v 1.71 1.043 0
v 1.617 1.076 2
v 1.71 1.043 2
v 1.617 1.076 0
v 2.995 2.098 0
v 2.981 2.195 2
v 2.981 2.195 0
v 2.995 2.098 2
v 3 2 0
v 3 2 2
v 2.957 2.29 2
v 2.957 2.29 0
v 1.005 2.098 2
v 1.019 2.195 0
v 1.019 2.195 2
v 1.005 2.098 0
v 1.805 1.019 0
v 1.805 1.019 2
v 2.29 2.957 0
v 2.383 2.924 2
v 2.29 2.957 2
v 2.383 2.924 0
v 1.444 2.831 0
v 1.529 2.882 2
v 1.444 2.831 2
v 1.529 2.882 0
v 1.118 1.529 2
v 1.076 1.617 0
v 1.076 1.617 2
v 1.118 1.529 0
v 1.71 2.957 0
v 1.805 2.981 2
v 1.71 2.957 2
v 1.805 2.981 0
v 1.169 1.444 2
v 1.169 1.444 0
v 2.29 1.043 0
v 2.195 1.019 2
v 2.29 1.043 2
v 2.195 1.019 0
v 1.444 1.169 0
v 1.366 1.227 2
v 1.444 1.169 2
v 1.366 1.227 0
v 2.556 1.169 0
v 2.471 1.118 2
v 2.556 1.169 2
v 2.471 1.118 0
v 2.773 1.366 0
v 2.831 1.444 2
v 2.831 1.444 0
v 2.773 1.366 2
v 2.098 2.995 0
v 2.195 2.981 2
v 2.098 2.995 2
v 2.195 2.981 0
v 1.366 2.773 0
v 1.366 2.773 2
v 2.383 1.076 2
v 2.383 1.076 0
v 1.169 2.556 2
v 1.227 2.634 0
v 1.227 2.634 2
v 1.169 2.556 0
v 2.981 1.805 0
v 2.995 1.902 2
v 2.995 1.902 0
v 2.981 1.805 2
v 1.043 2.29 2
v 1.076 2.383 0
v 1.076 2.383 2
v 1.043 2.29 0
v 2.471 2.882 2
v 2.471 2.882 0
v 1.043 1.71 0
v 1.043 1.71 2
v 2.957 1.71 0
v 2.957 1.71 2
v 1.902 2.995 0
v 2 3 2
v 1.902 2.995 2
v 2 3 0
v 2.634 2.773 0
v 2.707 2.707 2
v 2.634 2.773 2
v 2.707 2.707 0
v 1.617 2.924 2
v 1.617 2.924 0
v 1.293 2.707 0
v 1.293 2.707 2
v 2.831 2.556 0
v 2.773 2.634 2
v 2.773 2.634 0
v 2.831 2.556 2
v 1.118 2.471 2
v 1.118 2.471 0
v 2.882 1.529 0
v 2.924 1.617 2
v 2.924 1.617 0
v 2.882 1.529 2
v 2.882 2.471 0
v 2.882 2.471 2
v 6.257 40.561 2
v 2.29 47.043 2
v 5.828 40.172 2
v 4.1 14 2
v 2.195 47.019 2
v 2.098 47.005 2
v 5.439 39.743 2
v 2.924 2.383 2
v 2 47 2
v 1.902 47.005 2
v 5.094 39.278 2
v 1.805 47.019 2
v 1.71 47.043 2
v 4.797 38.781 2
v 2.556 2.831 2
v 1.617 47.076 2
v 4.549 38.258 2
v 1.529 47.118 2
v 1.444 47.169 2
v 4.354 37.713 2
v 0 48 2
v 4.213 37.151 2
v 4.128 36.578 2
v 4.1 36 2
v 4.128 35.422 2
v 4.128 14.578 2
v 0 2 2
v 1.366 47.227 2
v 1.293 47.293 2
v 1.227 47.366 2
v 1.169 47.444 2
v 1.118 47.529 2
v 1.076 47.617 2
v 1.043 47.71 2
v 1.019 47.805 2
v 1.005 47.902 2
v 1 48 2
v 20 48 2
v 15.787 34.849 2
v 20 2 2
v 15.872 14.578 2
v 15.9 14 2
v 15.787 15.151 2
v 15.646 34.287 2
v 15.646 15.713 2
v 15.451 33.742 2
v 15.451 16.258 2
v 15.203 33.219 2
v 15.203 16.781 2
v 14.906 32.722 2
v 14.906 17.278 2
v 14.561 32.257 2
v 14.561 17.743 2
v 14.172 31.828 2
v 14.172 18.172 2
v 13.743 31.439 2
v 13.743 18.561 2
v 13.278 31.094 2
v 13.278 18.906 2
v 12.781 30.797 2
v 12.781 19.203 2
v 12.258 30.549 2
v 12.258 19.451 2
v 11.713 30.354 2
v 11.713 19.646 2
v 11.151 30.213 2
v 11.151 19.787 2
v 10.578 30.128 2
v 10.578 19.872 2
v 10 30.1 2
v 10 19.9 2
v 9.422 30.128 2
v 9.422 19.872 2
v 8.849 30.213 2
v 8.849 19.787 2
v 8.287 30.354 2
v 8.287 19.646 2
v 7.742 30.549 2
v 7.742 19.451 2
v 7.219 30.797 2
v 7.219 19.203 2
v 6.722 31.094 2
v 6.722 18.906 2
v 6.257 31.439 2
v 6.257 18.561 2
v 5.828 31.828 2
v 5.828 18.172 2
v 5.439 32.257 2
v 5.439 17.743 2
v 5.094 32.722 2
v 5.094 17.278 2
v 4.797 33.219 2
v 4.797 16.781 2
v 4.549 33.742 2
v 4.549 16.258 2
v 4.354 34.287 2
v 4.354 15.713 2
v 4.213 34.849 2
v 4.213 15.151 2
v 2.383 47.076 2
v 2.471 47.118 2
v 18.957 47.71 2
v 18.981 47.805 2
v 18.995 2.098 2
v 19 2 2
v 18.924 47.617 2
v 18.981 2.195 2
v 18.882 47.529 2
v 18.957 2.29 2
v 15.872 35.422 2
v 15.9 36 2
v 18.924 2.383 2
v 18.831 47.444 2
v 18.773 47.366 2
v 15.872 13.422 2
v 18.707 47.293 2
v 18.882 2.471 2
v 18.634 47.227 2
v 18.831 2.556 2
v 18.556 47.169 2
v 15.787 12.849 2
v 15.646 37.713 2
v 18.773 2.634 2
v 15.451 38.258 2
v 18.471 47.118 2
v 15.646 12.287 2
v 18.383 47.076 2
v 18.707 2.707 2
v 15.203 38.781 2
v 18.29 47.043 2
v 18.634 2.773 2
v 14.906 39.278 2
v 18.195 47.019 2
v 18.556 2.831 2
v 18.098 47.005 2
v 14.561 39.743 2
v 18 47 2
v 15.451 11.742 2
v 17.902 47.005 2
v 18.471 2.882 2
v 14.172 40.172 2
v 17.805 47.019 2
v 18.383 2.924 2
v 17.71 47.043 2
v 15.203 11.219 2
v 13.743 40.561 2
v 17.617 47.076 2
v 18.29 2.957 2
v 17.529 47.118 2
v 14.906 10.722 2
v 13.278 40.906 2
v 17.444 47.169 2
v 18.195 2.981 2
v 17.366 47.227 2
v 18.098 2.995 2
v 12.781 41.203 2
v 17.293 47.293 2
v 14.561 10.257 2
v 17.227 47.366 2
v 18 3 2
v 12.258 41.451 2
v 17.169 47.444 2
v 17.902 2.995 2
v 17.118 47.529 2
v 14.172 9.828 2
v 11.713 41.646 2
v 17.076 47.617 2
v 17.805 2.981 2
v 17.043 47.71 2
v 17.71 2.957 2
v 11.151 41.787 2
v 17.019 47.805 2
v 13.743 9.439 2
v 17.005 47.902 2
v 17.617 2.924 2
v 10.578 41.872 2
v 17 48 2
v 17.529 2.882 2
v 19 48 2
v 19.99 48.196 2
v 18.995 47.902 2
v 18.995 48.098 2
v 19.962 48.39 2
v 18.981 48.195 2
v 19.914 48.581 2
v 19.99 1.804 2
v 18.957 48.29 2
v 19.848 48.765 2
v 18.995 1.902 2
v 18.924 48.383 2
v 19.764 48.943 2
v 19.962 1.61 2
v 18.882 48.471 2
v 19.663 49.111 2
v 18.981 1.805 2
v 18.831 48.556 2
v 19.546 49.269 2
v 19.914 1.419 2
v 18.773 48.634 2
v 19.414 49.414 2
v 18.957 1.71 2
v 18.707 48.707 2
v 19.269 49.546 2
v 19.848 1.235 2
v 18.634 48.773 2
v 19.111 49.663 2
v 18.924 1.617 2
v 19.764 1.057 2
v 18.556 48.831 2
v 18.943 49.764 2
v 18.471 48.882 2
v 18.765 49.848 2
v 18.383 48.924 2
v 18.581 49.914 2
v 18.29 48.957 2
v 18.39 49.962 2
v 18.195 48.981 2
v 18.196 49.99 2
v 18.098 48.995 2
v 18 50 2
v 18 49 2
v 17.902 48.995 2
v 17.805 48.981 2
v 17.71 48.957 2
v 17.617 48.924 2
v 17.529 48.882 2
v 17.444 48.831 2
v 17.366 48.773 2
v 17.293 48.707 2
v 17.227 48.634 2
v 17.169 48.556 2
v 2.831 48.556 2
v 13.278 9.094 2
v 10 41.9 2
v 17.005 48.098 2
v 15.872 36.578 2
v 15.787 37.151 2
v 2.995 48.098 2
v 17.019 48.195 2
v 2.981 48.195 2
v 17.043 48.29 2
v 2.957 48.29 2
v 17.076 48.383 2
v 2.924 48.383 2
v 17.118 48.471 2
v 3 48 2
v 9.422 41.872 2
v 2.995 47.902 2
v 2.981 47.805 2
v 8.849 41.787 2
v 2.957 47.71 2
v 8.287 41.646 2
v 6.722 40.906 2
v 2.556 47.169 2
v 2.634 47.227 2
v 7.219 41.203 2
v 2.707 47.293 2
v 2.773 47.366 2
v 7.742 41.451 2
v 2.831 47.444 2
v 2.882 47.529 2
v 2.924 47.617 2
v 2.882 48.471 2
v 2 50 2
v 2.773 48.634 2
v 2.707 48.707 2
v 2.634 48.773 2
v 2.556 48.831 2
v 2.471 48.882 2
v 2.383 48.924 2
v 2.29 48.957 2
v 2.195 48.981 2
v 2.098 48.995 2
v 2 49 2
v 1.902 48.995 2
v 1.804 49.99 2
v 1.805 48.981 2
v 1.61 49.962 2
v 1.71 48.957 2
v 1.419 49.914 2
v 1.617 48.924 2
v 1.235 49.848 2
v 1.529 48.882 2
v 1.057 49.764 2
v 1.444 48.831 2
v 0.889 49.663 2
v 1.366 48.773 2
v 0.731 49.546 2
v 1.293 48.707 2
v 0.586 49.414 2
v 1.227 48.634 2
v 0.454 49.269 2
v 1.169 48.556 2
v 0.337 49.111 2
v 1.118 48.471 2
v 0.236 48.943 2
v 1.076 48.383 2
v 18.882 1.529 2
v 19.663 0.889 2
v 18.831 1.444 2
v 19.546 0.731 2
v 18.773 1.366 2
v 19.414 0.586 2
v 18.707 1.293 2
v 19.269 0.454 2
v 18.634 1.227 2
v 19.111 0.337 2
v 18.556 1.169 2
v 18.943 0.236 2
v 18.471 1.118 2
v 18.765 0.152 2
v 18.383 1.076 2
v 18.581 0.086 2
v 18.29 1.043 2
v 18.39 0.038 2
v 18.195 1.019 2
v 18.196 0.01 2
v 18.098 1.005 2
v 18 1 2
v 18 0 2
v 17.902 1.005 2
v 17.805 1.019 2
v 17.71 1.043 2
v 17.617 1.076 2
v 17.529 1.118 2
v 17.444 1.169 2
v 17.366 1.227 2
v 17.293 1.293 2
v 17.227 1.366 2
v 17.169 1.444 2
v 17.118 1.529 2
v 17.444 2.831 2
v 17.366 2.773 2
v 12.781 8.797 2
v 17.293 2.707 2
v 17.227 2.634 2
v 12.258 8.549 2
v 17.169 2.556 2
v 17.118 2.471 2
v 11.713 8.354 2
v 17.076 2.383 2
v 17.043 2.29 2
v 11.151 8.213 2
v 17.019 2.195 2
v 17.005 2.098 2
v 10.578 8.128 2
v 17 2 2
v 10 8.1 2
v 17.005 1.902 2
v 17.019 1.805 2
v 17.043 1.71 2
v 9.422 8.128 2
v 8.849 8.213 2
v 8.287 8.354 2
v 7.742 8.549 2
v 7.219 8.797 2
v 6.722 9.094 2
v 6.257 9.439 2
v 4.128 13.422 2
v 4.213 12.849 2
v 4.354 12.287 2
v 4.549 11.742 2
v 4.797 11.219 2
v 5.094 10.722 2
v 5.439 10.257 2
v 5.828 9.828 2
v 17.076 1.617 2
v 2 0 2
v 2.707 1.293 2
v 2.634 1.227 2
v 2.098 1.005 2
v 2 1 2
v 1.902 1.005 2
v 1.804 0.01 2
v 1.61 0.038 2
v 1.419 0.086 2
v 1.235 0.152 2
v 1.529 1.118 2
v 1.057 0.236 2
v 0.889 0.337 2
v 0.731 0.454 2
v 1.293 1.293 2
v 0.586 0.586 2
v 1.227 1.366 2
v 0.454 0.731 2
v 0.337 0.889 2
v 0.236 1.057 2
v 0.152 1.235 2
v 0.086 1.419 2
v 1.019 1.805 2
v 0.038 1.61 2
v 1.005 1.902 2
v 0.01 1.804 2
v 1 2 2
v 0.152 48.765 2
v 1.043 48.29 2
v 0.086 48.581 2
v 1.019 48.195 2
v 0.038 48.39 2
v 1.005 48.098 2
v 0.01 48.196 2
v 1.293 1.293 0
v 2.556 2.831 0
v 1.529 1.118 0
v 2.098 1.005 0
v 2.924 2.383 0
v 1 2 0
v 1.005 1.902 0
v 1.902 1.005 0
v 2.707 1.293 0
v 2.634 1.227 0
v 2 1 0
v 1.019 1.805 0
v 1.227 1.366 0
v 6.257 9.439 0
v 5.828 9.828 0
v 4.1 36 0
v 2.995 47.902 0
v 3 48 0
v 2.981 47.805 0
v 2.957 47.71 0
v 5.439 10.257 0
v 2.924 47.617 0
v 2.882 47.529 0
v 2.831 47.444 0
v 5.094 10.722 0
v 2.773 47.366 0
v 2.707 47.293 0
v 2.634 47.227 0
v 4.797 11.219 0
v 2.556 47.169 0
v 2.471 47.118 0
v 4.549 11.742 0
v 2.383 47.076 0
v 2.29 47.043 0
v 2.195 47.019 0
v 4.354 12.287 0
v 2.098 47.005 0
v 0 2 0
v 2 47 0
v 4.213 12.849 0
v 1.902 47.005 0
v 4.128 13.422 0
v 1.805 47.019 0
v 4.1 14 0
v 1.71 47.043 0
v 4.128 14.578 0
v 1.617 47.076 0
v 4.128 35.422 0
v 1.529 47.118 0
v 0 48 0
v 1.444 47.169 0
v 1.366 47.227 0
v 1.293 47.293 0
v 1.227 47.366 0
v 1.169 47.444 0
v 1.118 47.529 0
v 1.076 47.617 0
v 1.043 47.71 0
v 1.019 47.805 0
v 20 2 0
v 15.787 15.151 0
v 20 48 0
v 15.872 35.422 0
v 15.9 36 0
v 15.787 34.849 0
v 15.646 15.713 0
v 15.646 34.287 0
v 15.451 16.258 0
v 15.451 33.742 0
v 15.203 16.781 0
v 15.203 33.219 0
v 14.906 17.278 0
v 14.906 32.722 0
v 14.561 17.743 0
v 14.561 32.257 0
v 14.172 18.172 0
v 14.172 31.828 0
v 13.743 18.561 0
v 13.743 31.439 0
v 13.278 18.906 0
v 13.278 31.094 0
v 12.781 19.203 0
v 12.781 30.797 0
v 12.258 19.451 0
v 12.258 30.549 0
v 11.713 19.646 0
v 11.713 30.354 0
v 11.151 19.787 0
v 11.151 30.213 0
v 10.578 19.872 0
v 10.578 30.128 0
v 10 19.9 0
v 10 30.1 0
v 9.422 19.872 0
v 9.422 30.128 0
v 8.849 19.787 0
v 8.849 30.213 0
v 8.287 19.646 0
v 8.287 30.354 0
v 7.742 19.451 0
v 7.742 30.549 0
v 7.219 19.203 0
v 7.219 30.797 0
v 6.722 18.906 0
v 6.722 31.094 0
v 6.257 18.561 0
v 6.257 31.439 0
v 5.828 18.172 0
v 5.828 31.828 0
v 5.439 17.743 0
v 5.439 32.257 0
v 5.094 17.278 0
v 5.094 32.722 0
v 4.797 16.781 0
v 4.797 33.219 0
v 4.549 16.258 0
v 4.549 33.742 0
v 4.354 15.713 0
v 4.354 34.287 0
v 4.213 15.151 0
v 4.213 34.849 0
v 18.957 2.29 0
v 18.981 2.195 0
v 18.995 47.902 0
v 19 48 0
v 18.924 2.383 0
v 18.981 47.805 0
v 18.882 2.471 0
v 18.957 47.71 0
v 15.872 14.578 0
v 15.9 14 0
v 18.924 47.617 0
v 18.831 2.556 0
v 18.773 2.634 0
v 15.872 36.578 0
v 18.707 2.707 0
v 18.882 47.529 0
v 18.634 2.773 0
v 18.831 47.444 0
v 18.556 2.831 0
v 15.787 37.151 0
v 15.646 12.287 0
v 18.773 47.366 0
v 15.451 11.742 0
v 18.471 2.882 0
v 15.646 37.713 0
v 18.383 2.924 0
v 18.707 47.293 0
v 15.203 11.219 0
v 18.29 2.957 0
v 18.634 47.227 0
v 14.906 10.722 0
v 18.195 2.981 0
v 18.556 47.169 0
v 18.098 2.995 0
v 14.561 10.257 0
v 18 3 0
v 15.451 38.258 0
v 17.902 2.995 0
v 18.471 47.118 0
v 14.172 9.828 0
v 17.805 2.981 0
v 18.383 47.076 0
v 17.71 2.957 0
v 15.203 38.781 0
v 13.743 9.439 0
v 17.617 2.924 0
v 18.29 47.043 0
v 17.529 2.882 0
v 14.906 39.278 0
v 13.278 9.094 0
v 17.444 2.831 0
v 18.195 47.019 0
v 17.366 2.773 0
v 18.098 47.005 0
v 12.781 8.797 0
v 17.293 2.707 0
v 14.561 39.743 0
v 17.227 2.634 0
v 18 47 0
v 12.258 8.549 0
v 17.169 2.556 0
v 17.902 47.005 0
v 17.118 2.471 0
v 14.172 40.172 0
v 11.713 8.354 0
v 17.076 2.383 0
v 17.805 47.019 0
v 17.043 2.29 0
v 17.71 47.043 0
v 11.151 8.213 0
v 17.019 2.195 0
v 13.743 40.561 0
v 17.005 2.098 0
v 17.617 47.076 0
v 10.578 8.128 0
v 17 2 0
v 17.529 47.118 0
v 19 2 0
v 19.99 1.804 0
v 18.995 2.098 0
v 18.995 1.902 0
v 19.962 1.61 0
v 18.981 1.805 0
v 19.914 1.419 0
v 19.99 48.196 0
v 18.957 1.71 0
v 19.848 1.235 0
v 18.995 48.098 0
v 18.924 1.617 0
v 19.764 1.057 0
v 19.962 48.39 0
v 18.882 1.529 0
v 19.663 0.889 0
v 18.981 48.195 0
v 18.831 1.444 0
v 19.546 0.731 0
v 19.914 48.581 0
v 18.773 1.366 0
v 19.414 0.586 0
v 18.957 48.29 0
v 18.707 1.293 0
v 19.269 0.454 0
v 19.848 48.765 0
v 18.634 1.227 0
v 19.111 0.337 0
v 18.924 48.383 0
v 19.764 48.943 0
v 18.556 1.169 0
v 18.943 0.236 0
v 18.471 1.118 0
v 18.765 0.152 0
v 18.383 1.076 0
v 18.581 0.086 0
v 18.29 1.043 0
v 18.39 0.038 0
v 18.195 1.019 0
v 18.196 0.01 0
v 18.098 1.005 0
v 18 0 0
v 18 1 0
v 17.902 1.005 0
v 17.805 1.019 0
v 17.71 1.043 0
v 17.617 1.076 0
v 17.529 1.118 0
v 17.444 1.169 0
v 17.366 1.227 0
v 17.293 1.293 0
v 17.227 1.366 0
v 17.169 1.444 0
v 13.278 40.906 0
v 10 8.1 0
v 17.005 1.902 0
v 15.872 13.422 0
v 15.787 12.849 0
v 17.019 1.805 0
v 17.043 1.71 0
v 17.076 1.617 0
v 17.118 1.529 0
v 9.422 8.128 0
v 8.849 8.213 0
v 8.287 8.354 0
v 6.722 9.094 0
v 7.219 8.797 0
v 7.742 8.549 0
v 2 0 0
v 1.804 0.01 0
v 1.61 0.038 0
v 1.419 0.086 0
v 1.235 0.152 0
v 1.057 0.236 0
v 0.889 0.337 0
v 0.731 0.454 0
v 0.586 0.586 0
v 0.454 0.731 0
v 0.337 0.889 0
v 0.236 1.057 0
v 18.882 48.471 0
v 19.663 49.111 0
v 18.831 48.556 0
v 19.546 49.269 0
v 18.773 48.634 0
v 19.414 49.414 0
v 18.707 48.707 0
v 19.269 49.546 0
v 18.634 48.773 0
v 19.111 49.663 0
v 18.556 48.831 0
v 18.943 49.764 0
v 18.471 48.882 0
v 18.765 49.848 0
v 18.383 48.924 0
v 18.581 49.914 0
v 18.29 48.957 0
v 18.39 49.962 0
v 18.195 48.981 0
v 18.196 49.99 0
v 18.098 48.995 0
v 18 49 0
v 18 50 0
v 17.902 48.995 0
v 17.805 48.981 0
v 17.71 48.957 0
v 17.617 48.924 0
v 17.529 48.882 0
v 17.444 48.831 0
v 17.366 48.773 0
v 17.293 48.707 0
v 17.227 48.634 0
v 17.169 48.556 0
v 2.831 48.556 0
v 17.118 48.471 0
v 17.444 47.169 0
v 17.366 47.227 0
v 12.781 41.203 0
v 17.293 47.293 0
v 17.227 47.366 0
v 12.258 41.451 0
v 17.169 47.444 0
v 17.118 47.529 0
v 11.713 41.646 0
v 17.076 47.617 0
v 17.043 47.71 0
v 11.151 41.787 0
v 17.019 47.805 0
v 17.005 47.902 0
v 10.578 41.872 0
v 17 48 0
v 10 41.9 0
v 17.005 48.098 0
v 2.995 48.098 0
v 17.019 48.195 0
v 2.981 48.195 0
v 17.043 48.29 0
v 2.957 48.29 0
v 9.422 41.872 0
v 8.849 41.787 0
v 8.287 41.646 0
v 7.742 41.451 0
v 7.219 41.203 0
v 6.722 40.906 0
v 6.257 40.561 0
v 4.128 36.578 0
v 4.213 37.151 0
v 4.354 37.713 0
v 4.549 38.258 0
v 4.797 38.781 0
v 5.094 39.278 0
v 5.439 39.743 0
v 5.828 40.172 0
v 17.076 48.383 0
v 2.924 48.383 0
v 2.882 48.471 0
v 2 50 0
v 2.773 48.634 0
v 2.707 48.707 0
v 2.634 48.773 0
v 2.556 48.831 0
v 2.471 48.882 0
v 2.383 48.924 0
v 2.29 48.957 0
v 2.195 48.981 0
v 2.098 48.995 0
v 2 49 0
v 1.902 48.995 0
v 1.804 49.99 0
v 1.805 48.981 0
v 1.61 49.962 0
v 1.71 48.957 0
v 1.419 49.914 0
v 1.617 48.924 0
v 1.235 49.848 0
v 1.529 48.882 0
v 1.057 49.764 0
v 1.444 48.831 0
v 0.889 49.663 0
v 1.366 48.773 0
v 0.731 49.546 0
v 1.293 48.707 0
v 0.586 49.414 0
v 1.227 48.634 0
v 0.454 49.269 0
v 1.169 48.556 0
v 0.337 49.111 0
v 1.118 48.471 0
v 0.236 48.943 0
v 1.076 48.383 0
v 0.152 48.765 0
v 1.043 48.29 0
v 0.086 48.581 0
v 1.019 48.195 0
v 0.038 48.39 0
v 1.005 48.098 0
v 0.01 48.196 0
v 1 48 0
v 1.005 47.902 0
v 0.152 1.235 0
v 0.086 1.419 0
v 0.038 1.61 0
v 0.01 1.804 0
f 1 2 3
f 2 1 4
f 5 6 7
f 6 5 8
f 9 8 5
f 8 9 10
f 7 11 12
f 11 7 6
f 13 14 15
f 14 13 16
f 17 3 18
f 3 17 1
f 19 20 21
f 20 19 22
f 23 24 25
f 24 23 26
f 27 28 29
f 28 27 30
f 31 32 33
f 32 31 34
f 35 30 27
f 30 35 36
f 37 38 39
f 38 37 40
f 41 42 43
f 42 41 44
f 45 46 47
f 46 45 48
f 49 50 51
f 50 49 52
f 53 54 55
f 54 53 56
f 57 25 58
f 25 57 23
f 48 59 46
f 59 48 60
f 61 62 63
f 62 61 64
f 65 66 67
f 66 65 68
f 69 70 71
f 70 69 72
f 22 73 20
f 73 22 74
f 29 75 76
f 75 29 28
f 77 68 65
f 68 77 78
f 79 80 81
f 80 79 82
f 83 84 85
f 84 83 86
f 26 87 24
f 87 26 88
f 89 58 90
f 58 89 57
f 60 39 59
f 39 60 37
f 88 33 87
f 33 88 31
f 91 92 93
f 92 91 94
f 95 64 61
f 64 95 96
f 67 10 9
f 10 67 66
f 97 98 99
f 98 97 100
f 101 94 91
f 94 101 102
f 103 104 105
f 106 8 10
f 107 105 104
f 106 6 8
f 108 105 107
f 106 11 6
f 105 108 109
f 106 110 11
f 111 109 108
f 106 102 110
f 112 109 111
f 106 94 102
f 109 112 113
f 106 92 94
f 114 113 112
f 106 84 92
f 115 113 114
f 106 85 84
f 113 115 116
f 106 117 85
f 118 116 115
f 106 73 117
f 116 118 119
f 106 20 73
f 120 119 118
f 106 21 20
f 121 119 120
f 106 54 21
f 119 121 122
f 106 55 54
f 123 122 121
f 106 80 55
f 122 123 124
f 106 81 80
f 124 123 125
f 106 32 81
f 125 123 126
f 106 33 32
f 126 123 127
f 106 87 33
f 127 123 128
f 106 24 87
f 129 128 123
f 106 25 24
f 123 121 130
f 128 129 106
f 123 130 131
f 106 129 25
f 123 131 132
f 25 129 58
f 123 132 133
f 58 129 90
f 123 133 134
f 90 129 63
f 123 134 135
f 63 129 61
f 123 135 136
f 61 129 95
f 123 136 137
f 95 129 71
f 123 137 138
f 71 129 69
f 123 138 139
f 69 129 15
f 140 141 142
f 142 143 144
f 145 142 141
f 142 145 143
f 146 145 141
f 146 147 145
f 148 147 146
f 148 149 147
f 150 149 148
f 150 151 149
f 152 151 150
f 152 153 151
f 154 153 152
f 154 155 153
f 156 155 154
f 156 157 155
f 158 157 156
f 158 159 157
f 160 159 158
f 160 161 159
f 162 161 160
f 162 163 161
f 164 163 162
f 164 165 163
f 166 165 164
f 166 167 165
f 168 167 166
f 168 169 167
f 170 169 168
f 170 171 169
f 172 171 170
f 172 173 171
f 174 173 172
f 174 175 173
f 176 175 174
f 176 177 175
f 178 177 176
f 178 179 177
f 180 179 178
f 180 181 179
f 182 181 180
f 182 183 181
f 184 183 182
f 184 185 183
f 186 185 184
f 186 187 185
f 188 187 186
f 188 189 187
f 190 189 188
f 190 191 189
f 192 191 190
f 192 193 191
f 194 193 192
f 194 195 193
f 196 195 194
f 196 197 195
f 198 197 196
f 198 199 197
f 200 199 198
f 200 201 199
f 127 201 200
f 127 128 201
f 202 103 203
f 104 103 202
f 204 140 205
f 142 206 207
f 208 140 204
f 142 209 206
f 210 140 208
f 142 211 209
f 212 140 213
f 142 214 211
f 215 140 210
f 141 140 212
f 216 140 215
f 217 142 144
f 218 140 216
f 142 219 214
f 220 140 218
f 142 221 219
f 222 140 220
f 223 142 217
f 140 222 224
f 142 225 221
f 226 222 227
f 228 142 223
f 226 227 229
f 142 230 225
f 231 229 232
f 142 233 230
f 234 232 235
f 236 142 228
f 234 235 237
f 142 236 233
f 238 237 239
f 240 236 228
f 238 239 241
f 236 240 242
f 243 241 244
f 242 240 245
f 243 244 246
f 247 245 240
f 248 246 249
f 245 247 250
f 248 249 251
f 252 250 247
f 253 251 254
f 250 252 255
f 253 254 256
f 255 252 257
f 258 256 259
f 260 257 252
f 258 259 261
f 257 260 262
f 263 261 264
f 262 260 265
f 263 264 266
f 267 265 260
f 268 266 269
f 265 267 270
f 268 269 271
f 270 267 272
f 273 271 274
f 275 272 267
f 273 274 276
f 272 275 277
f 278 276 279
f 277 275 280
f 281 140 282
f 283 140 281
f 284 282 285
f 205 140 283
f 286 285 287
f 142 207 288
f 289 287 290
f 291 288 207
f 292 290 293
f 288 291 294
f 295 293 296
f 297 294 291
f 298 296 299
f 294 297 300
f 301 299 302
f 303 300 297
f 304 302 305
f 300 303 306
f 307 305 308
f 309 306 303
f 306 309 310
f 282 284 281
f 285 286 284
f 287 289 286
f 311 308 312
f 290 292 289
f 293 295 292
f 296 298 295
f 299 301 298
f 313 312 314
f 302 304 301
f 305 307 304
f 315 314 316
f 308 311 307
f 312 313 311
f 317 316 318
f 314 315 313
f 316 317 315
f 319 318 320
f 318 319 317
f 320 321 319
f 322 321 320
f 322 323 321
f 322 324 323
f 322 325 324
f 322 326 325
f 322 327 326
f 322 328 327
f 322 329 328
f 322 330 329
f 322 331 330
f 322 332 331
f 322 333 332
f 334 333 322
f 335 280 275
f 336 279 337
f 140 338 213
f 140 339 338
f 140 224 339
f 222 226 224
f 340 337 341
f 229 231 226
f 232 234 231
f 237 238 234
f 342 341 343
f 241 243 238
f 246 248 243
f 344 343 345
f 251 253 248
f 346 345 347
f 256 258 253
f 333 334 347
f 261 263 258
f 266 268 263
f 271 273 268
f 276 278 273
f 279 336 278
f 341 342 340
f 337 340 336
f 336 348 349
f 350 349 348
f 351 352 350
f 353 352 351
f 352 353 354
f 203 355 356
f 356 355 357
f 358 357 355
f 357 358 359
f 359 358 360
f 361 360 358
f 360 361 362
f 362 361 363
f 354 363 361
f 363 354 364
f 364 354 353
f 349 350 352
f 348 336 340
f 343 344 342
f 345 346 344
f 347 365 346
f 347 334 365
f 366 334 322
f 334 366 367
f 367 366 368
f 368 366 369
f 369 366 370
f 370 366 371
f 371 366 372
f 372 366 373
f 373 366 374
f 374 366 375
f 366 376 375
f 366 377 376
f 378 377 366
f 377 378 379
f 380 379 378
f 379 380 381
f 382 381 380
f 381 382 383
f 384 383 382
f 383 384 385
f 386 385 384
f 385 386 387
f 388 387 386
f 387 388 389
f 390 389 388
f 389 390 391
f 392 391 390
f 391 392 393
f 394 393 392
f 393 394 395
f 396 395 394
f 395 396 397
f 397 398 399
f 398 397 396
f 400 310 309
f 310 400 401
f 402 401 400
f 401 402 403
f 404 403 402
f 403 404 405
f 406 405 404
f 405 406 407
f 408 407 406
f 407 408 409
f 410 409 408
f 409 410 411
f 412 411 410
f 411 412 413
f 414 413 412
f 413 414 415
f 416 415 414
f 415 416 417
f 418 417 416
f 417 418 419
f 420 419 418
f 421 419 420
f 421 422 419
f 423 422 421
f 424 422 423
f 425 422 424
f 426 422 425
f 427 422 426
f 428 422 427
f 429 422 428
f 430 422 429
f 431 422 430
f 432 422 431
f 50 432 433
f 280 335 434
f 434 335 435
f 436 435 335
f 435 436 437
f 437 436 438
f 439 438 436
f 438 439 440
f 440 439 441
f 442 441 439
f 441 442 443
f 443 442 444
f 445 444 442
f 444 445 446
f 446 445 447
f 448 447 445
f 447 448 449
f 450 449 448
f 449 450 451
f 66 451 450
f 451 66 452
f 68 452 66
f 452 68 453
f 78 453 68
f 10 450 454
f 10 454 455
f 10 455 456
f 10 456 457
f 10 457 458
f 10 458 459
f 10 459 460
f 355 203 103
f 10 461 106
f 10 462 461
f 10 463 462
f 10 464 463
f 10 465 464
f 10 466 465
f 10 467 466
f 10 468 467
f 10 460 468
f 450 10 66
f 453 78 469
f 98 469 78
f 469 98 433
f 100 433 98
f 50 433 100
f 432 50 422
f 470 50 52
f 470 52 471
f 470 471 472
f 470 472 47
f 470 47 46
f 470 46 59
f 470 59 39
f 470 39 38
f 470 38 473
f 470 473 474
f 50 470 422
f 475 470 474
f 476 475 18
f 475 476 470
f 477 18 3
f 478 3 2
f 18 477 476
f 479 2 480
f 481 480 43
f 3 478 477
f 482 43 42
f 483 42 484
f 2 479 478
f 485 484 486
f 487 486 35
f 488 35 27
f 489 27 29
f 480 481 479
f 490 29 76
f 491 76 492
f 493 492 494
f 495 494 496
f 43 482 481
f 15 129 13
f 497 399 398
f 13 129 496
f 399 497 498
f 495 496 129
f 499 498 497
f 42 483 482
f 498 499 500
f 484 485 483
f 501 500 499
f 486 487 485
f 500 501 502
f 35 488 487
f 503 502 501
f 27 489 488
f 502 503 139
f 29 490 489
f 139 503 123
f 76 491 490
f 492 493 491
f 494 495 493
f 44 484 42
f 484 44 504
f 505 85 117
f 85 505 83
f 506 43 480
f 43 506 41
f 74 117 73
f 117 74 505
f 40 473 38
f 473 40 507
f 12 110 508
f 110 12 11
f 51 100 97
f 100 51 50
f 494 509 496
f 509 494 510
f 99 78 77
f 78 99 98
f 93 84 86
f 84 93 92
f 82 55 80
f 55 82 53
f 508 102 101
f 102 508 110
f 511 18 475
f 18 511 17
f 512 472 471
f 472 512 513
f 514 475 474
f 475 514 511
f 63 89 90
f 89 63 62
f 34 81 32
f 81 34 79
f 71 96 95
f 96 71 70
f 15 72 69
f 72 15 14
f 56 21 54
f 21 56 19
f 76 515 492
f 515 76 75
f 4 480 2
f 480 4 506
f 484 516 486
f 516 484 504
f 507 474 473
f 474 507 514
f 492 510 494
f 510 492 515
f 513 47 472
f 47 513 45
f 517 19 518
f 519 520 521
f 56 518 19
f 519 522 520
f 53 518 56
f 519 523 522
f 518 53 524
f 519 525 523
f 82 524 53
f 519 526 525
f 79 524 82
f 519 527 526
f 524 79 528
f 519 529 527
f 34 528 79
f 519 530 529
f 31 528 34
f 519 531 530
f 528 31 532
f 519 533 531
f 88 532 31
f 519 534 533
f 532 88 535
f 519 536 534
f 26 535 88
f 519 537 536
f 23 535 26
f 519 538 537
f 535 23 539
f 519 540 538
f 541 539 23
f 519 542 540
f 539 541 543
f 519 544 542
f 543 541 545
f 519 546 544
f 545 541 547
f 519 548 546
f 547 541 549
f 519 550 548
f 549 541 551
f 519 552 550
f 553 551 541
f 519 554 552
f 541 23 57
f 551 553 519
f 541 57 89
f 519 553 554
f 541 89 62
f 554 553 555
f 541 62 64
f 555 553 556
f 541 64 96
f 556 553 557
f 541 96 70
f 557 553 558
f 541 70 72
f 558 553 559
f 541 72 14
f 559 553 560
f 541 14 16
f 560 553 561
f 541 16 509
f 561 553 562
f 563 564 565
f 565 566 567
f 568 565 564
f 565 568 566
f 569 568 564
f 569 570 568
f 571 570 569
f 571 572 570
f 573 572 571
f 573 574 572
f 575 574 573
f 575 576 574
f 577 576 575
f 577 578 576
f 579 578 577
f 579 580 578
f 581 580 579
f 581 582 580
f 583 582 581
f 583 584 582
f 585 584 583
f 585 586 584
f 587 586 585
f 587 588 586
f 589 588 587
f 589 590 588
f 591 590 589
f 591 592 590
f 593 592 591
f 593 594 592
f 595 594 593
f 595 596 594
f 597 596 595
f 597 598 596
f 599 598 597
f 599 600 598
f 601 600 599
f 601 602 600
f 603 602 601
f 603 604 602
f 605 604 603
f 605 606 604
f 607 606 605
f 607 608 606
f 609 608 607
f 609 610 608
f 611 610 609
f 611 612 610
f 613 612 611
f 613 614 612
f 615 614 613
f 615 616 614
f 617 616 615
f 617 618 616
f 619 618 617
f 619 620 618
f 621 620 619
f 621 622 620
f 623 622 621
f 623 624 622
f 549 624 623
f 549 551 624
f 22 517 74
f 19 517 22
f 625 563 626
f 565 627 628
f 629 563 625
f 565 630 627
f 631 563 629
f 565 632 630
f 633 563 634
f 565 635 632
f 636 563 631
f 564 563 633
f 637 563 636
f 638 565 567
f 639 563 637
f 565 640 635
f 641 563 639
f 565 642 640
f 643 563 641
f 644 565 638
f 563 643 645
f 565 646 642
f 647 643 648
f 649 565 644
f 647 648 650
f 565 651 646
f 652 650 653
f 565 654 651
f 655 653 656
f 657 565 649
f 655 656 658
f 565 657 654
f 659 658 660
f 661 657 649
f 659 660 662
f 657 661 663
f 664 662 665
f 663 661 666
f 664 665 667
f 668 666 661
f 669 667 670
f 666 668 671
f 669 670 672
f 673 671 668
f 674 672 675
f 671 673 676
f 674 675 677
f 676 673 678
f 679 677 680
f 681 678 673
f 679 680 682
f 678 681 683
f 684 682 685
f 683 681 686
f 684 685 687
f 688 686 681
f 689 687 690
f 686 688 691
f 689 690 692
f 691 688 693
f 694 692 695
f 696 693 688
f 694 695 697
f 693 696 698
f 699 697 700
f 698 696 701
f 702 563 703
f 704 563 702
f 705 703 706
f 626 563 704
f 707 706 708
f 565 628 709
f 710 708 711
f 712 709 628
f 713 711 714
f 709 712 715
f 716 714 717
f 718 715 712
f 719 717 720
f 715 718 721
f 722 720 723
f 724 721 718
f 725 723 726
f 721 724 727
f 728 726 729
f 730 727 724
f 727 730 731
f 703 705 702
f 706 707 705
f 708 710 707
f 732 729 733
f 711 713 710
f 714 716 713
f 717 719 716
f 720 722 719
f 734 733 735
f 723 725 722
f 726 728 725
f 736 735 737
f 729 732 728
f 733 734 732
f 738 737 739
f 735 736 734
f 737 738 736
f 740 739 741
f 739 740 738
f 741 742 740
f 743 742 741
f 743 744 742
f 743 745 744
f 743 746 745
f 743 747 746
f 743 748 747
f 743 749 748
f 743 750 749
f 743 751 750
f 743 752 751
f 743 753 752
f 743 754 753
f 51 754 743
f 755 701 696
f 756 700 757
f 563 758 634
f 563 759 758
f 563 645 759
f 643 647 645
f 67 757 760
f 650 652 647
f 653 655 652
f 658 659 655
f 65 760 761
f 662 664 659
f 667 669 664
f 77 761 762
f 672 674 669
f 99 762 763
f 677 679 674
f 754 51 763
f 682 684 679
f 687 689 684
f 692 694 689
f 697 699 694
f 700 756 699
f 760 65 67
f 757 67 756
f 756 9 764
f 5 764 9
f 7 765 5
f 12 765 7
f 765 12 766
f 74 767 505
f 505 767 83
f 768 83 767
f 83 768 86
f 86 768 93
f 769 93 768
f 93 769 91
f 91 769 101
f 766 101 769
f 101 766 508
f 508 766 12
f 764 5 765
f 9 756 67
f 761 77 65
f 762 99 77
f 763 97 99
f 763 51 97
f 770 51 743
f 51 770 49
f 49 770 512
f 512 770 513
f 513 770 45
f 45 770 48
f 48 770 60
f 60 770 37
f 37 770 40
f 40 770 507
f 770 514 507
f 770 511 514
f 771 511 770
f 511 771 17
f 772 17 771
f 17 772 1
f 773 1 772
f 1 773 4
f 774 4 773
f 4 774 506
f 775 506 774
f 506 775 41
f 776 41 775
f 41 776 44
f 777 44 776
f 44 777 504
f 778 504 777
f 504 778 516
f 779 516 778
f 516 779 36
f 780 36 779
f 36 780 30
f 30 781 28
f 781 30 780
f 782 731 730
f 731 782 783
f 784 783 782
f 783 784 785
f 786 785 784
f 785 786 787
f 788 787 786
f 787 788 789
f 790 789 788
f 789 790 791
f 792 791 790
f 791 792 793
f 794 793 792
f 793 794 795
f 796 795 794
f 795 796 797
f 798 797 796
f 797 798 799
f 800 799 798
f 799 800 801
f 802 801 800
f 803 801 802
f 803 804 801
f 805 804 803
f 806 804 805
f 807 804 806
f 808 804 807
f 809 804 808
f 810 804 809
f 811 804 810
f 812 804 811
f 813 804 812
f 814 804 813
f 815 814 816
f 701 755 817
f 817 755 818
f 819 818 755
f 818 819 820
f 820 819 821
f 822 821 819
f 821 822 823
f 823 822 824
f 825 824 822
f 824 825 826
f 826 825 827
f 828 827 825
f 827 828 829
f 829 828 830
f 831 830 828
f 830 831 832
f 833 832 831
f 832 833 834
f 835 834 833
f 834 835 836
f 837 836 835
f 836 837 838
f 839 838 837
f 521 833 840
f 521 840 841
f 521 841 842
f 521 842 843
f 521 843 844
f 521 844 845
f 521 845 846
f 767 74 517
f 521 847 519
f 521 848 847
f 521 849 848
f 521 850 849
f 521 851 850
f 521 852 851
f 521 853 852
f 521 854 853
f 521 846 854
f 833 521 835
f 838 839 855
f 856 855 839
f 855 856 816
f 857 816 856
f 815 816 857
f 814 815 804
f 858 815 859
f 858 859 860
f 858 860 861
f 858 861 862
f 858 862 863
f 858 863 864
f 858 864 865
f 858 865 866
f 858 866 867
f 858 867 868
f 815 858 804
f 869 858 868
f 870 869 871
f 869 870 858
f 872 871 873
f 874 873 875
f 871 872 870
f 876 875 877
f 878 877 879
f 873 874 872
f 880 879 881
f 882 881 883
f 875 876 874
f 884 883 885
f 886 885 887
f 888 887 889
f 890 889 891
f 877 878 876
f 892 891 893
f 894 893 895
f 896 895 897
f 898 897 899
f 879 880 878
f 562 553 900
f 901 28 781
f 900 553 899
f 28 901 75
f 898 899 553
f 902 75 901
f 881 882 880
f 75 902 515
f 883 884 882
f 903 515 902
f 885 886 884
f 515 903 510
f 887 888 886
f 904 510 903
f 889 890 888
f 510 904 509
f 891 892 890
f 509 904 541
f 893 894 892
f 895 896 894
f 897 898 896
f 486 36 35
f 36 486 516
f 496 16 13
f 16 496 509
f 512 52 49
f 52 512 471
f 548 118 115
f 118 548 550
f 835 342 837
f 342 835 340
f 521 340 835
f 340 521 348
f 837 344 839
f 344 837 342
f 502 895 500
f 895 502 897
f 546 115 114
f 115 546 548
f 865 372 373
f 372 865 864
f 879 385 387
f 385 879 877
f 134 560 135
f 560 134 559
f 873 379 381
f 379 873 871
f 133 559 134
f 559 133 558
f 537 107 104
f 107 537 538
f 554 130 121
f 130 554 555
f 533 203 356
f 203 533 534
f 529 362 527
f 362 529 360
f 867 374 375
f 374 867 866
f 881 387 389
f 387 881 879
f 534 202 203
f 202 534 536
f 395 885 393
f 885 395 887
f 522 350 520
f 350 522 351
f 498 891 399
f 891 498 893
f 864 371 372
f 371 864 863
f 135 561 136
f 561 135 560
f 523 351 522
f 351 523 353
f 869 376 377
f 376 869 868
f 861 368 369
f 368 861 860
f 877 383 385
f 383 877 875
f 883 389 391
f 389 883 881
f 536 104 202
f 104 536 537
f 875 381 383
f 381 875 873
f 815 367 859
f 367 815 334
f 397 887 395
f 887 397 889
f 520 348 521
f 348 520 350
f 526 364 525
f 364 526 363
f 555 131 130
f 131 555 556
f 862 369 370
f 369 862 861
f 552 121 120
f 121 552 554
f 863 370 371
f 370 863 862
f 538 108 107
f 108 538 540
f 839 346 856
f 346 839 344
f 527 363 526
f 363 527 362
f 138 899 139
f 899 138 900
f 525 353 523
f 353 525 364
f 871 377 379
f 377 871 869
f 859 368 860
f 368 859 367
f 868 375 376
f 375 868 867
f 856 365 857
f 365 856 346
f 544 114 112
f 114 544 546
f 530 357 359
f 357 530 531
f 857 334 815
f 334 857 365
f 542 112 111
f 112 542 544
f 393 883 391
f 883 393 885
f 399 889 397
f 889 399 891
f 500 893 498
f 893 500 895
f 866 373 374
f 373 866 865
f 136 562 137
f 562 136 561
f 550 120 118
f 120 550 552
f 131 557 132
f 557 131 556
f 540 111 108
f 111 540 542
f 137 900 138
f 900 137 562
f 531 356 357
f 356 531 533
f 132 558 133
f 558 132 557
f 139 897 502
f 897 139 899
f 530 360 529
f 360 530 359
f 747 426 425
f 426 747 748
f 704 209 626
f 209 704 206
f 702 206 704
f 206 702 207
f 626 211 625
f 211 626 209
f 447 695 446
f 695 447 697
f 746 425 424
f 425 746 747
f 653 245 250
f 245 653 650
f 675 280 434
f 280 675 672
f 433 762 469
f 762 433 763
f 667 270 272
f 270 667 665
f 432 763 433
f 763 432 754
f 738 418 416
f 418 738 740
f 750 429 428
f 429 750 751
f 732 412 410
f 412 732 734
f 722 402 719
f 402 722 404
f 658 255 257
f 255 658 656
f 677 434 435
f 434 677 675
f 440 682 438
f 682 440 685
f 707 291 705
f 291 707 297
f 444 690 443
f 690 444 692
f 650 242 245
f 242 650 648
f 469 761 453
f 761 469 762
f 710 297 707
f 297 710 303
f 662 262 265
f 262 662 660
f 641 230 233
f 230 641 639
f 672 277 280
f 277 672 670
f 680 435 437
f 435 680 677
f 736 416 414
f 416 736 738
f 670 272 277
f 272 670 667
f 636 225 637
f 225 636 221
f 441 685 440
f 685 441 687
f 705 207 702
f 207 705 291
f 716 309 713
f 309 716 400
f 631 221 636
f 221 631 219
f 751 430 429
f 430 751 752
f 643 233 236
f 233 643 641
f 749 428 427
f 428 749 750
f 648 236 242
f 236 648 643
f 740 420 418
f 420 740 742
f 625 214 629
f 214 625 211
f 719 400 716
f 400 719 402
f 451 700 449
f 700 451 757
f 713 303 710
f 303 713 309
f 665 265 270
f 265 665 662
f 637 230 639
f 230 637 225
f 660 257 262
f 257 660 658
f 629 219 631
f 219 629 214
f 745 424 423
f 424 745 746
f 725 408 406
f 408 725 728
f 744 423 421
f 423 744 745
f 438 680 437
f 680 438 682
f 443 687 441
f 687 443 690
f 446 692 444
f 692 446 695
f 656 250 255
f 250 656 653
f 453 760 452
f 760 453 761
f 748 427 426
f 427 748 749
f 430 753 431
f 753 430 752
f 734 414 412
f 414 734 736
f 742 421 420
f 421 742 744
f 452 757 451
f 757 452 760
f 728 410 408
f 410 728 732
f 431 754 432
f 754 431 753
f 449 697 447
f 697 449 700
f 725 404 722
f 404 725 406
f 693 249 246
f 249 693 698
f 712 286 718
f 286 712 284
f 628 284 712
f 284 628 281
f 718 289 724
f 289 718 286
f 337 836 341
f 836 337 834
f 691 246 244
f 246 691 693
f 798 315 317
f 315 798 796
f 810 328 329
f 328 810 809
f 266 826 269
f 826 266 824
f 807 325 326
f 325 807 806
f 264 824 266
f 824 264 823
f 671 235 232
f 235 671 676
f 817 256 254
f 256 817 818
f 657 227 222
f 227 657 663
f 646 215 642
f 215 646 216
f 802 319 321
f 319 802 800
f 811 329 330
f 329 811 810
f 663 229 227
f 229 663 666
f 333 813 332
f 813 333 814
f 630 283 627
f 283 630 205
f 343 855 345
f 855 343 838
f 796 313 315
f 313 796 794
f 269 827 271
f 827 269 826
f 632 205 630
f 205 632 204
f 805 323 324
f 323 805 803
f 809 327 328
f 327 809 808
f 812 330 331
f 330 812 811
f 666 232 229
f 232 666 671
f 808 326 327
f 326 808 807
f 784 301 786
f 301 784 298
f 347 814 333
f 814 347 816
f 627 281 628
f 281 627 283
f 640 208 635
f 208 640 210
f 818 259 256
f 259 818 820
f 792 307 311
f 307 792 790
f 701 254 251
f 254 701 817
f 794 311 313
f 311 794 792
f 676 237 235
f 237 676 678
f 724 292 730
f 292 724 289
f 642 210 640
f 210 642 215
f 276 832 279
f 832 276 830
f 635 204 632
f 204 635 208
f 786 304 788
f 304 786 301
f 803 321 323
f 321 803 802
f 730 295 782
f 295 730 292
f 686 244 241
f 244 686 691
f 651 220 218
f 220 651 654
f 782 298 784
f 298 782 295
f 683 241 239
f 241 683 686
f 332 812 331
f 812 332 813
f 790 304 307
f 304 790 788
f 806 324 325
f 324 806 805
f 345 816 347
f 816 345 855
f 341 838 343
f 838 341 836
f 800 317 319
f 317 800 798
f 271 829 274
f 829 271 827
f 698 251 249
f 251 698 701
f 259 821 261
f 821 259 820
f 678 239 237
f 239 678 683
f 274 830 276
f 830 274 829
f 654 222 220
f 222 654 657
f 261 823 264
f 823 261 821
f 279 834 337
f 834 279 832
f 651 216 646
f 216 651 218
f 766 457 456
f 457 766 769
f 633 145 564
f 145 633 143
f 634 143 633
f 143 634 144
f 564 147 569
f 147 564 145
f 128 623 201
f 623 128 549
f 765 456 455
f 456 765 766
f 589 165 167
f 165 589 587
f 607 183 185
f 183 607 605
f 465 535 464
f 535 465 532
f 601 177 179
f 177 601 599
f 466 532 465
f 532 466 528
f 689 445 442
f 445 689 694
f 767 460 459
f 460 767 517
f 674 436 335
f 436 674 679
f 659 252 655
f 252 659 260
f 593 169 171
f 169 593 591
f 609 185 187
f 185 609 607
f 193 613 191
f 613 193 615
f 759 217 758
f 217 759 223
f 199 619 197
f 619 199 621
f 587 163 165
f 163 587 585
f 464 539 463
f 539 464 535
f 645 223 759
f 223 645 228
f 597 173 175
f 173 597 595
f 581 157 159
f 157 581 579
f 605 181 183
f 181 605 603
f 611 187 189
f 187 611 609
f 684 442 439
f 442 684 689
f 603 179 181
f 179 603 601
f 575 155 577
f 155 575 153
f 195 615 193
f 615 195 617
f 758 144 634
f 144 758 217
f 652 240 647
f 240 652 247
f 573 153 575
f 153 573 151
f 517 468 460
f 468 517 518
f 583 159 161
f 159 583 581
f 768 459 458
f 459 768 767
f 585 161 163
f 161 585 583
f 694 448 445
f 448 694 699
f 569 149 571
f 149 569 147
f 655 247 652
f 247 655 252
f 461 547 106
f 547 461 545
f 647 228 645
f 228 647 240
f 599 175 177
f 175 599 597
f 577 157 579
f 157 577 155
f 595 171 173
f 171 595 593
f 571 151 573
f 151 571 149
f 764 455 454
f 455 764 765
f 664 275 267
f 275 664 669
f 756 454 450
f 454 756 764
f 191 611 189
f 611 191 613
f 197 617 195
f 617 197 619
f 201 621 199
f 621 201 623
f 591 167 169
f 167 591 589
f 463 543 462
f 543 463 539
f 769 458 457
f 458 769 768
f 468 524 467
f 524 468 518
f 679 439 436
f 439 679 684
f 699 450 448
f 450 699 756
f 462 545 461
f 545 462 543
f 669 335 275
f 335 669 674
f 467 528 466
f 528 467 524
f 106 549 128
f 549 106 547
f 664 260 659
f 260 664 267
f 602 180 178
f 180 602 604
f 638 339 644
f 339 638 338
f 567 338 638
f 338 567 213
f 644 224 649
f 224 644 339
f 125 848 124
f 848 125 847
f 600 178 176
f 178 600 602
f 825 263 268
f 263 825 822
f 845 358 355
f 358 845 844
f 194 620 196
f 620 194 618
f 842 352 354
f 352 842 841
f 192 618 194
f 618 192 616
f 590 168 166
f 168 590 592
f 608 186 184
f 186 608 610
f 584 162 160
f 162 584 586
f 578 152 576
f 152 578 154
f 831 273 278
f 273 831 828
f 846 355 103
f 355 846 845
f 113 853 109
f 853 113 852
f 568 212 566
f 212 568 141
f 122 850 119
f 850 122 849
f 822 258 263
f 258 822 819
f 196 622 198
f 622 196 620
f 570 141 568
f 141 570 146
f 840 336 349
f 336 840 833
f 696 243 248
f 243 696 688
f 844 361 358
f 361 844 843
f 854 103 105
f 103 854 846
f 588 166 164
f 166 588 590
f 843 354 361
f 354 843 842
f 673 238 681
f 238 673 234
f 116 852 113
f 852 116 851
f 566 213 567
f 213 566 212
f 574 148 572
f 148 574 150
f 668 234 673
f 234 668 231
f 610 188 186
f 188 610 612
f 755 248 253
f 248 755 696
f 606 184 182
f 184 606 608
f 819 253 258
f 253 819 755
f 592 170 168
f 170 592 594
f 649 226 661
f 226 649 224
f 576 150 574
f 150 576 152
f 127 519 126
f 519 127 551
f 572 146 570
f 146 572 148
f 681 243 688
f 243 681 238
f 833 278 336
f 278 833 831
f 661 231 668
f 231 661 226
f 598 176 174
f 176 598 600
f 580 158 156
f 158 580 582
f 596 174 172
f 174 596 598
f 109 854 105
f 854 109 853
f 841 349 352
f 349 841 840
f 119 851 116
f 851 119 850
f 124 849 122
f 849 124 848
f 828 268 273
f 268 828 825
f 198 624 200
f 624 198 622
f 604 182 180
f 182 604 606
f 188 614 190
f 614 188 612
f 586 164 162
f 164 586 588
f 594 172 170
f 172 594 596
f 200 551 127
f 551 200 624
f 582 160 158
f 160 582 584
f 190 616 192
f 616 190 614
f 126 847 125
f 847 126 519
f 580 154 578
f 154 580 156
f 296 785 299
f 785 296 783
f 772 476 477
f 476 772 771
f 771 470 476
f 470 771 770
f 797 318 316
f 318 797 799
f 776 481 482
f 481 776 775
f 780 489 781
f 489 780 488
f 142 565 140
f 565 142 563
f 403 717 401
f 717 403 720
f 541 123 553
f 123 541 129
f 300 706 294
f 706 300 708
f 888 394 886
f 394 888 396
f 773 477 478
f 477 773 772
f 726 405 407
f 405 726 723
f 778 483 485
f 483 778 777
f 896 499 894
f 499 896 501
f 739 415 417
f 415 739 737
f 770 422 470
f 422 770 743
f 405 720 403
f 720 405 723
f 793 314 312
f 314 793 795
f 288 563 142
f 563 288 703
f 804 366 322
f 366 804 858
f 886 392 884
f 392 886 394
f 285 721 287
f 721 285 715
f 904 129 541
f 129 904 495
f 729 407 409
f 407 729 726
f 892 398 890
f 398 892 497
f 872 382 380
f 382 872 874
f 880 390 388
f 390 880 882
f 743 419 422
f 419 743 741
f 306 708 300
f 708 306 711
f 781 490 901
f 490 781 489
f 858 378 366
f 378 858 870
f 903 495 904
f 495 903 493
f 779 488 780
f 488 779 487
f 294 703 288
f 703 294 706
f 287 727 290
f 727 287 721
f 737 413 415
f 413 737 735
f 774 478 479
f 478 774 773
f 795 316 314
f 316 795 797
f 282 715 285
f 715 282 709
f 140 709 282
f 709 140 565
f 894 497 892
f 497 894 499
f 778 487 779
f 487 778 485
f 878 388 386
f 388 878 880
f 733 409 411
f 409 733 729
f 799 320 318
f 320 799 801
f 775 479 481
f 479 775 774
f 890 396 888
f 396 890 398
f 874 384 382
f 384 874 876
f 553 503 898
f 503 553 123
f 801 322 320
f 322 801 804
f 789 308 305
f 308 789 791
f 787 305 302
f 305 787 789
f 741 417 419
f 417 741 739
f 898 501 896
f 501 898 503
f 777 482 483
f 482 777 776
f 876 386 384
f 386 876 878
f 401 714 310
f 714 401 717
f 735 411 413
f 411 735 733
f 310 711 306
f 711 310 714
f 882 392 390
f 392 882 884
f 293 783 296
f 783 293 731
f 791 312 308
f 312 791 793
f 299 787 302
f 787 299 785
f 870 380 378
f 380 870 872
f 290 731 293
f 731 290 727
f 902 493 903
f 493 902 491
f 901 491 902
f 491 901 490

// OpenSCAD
$fn=64;

difference() {
  minkowski() {
    translate([2, 2, 0]) cube([20-2*2, 50-2*2, 1]);
    cylinder(h=1, r=2);
  }
//  cube([20, 50, 2], center=false);
  union() {
    Screwholes();
    WihaPicoFinish();
  }
}

module Screwholes() {
  translate([2, 2, 0]) cylinder(h=2, d=2);
  translate([2, 50-2, 0]) cylinder(h=2, d=2);
  translate([20-2, 2, 0]) cylinder(h=2, d=2);
  translate([20-2, 50-2, 0]) cylinder(h=2, d=2);
}

module Snips() {
  translate([4, 10.65, 0]) union() {
    cube([12, 28.7, 2]);
    translate([6, 0, 0]) cylinder(h=2, d=12);
    translate([6, 28.7, 0]) cylinder(h=2, d=12);
  }
}

module Caliper() {
  translate([7, 25, 0]) union() {
    cube([6, 18, 2]);
  }
}

module Scraper() {
  translate([9.7, 6, 0]) union() {
    cube([0.6, 38, 2]);
  }
}

module Klein() {
  translate([10, 25, 0]) union() {
    cylinder(h=2, d=11.3);
  }
}

module Pliers() {
  translate([4.5, 14, 0]) union() {
    cube([11, 22, 2]);
    translate([5.5, 0, 0]) cylinder(h=2, d=11);
    translate([5.5, 22, 0]) cylinder(h=2, d=11);
  }
}

module Scissors() {
  translate([5.75, 10.5, 0]) union() {
    minkowski() {
      translate([2, 2, 0]) cube([9-2*2, 29-2*2, 1]);
      cylinder(h=1, r=2);
    }
  }
}

module ScrewdriverCutter() {
  translate([10, 35, 0]) cylinder(h=2, d=10.1);
  translate([4.25, 12, 0]) cube([11.5, 6, 2]);
}

// Wiha PicoFinish precision screwdrivers.
module WihaPicoFinish() {
  translate([10, 14, 0]) cylinder(h=2, d=11.8);
//  translate([10, 14, 0]) cylinder(h=2, d=10.5);
  translate([10, 36, 0]) cylinder(h=2, d=11.8);
//  translate([10, 36, 0]) cylinder(h=2, d=10.5);
}
